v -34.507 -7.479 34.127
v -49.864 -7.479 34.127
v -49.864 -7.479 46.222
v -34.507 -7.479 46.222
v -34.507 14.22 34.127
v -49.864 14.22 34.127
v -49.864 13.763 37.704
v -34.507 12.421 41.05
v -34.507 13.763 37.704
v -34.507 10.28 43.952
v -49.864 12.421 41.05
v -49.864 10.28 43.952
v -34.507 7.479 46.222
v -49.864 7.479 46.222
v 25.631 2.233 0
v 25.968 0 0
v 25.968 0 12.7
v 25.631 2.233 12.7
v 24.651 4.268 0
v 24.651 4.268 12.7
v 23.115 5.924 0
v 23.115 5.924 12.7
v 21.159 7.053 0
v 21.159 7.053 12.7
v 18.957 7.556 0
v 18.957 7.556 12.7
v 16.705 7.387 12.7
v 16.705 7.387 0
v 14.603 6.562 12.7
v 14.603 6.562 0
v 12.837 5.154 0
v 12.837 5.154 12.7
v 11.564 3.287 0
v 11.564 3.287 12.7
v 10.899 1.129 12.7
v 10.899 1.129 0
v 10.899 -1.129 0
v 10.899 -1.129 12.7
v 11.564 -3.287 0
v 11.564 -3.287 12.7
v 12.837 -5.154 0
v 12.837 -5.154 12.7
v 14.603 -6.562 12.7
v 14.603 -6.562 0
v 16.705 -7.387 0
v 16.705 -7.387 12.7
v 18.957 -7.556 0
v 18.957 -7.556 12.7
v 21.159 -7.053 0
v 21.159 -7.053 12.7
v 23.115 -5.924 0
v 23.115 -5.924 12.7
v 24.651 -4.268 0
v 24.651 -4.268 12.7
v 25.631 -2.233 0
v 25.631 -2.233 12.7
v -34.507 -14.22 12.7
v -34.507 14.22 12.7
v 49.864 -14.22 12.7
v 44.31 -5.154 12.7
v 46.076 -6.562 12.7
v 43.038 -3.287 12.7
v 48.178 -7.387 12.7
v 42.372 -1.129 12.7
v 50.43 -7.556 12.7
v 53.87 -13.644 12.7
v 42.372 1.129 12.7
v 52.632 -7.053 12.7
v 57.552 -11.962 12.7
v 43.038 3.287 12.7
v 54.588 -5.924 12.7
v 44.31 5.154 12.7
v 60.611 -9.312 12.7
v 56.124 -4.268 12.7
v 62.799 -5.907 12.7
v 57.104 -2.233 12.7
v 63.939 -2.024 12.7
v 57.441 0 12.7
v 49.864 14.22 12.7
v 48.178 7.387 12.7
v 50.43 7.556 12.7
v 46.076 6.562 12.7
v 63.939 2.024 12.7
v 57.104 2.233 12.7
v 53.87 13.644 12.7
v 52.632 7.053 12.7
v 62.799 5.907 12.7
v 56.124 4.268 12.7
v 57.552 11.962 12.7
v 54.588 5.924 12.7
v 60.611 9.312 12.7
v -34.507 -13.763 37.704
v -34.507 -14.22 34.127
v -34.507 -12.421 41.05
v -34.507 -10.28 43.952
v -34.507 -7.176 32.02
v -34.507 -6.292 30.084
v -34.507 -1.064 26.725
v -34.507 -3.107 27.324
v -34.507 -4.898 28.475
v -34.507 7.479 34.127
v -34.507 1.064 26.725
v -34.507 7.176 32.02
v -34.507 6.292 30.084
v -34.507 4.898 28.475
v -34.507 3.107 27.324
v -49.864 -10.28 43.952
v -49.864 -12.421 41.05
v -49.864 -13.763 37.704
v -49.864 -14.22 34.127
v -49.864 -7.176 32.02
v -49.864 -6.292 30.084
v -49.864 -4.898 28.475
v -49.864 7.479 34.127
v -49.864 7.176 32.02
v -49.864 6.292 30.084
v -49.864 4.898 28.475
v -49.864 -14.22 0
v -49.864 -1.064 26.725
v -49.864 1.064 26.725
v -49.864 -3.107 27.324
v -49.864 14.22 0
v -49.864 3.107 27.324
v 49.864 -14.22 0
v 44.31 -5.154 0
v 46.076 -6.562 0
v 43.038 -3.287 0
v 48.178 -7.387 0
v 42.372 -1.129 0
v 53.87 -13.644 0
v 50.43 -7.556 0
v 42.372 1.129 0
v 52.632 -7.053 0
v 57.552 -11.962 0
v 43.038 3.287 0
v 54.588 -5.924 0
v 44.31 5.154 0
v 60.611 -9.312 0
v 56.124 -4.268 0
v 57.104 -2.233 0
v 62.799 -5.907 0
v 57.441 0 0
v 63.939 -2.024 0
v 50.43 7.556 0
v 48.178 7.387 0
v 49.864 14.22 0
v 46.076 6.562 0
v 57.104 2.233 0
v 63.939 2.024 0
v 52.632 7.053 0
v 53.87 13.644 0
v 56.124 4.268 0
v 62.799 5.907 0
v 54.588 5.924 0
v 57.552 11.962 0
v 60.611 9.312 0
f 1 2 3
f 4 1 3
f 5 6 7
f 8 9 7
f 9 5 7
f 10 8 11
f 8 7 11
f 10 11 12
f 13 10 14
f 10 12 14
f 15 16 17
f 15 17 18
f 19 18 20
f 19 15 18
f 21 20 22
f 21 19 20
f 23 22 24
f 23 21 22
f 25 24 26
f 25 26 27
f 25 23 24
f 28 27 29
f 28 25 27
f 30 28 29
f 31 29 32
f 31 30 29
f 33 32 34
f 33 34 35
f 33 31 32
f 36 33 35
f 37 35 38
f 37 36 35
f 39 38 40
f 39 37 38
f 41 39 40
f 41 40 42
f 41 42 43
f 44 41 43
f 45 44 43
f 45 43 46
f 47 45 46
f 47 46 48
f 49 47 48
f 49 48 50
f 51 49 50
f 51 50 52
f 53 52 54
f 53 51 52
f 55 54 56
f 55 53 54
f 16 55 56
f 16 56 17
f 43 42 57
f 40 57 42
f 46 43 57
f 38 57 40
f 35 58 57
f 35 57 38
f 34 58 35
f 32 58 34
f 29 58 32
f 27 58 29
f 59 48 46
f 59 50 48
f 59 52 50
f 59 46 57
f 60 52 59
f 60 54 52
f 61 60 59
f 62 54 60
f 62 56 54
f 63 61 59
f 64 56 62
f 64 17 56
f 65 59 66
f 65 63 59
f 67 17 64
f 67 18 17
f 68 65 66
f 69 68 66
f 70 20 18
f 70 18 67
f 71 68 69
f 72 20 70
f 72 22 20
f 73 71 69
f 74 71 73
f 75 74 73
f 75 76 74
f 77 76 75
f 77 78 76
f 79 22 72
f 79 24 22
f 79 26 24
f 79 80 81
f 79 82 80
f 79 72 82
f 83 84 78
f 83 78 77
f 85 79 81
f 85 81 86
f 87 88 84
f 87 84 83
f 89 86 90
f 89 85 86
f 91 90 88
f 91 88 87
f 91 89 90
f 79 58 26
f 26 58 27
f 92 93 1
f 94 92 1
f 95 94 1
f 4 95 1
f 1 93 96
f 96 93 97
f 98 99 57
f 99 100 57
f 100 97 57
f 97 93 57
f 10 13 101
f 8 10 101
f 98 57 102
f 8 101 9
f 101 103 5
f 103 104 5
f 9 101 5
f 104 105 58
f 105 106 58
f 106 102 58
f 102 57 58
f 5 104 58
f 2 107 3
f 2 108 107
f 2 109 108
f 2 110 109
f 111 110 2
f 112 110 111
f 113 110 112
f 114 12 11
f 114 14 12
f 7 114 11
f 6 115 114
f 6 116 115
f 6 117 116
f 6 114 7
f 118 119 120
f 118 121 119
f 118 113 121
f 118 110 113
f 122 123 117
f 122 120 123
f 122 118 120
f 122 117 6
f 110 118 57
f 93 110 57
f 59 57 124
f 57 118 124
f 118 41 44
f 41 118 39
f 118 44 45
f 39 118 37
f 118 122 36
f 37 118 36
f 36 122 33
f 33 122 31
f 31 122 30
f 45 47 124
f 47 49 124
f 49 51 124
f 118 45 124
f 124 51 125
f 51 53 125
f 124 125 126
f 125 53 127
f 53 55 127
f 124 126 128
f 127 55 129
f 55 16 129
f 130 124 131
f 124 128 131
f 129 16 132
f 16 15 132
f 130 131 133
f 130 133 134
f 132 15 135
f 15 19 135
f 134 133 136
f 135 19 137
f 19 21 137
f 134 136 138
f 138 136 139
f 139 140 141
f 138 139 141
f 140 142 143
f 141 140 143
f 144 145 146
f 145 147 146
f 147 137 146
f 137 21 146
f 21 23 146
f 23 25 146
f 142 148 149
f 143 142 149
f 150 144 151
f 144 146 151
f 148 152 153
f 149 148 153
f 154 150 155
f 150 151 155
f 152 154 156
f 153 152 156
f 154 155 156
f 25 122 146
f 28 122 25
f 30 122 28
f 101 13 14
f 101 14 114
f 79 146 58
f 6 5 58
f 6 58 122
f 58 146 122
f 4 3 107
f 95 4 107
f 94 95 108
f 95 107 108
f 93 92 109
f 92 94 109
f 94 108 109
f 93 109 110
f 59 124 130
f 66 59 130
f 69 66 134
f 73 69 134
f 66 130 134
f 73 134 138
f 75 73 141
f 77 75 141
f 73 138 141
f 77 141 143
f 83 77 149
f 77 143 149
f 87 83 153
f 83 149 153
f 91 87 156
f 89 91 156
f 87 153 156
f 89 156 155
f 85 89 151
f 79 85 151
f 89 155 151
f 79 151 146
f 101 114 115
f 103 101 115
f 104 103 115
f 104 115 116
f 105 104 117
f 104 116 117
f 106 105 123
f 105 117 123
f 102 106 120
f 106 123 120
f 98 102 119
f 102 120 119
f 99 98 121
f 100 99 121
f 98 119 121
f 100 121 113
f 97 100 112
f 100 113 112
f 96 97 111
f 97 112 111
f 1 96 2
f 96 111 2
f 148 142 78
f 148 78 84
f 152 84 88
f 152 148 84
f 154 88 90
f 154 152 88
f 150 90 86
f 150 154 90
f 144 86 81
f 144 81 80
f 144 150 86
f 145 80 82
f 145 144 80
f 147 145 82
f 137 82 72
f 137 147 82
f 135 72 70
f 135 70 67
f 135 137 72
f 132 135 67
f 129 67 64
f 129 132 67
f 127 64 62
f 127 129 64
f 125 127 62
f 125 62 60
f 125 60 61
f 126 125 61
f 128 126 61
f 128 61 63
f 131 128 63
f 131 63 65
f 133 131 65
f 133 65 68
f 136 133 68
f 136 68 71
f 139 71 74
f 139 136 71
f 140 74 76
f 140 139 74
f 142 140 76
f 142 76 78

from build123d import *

# Parameters (mm, degrees)
F0_R     = 7.576774
F0_W     = 15.357372
F0_H     = 28.439574
F1_DEPTH = 12.7
F2_DEPTH = 50.8
F4_DEPTH = 113.948894
F5_DEPTH = 113.948894


with BuildPart() as f1:
    # F0 (on Top) → F1 (new body)
    with BuildSketch(Plane.XY):
        with BuildLine():
            ThreePointArc((49.864054, -14.219787), (64.083841, 0), (49.864054, 14.219787))
            Line((49.864054, 14.219787), (-34.506682, 14.219787))
            Line((-34.506682, 14.219787), (-34.506682, -14.219787))
            Line((-34.506682, -14.219787), (49.864054, -14.219787))
        make_face()
        with Locations((18.390924, 0)):
            Circle(F0_R, mode=Mode.SUBTRACT)
        with Locations((49.864054, 0)):
            Circle(F0_R, mode=Mode.SUBTRACT)
        with Locations((-42.185368, 0)):
            Rectangle(F0_W, F0_H)
    extrude(amount=F1_DEPTH)

    # F0 (on Top) → F2 (join)
    with BuildSketch(Plane.XY):
        with Locations((-42.185368, 0)):
            Rectangle(F0_W, F0_H)
    extrude(amount=F2_DEPTH)

    # F3 (on face) → F4 (cut, through all)
    with BuildSketch(Plane(origin=(-49.864054, 0, 0), x_dir=(0, -1, 0), z_dir=(-1, 0, 0))):
        with BuildLine():
            ThreePointArc((7.478881, 46.221647), (12.420758, 41.05043), (14.219787, 34.127489))
            Line((14.219787, 34.127489), (14.219787, 50.8))
            Line((14.219787, 50.8), (7.478881, 50.8))
            Line((7.478881, 50.8), (7.478881, 46.221647))
        make_face()
        with BuildLine():
            Line((7.478881, 34.127489), (7.478881, 46.221647))
            Line((7.478881, 46.221647), (7.478881, 50.8))
            Line((7.478881, 50.8), (-7.478881, 50.8))
            Line((-7.478881, 50.8), (-7.478881, 46.221647))
            Line((-7.478881, 46.221647), (-7.478881, 34.127489))
            ThreePointArc((-7.478881, 34.127489), (0, 26.648607), (7.478881, 34.127489))
        make_face()
        with BuildLine():
            Line((-7.478881, 46.221647), (-7.478881, 50.8))
            Line((-7.478881, 50.8), (-14.219787, 50.8))
            Line((-14.219787, 50.8), (-14.219787, 34.127489))
            ThreePointArc((-14.219787, 34.127489), (-12.420758, 41.05043), (-7.478881, 46.221647))
        make_face()
    extrude(amount=-F4_DEPTH, mode=Mode.SUBTRACT)

    # F3 (on face) → F5 (cut, through all)
    with BuildSketch(Plane(origin=(-49.864054, 0, 0), x_dir=(0, -1, 0), z_dir=(-1, 0, 0))):
        with BuildLine():
            ThreePointArc((7.478881, 46.221647), (12.420758, 41.05043), (14.219787, 34.127489))
            Line((14.219787, 34.127489), (14.219787, 50.8))
            Line((14.219787, 50.8), (7.478881, 50.8))
            Line((7.478881, 50.8), (7.478881, 46.221647))
        make_face()
        with BuildLine():
            Line((7.478881, 34.127489), (7.478881, 46.221647))
            Line((7.478881, 46.221647), (7.478881, 50.8))
            Line((7.478881, 50.8), (-7.478881, 50.8))
            Line((-7.478881, 50.8), (-7.478881, 46.221647))
            Line((-7.478881, 46.221647), (-7.478881, 34.127489))
            ThreePointArc((-7.478881, 34.127489), (0, 26.648607), (7.478881, 34.127489))
        make_face()
        with BuildLine():
            Line((-7.478881, 46.221647), (-7.478881, 50.8))
            Line((-7.478881, 50.8), (-14.219787, 50.8))
            Line((-14.219787, 50.8), (-14.219787, 34.127489))
            ThreePointArc((-14.219787, 34.127489), (-12.420758, 41.05043), (-7.478881, 46.221647))
        make_face()
    extrude(amount=-F5_DEPTH, mode=Mode.SUBTRACT)


solid = f1.part
